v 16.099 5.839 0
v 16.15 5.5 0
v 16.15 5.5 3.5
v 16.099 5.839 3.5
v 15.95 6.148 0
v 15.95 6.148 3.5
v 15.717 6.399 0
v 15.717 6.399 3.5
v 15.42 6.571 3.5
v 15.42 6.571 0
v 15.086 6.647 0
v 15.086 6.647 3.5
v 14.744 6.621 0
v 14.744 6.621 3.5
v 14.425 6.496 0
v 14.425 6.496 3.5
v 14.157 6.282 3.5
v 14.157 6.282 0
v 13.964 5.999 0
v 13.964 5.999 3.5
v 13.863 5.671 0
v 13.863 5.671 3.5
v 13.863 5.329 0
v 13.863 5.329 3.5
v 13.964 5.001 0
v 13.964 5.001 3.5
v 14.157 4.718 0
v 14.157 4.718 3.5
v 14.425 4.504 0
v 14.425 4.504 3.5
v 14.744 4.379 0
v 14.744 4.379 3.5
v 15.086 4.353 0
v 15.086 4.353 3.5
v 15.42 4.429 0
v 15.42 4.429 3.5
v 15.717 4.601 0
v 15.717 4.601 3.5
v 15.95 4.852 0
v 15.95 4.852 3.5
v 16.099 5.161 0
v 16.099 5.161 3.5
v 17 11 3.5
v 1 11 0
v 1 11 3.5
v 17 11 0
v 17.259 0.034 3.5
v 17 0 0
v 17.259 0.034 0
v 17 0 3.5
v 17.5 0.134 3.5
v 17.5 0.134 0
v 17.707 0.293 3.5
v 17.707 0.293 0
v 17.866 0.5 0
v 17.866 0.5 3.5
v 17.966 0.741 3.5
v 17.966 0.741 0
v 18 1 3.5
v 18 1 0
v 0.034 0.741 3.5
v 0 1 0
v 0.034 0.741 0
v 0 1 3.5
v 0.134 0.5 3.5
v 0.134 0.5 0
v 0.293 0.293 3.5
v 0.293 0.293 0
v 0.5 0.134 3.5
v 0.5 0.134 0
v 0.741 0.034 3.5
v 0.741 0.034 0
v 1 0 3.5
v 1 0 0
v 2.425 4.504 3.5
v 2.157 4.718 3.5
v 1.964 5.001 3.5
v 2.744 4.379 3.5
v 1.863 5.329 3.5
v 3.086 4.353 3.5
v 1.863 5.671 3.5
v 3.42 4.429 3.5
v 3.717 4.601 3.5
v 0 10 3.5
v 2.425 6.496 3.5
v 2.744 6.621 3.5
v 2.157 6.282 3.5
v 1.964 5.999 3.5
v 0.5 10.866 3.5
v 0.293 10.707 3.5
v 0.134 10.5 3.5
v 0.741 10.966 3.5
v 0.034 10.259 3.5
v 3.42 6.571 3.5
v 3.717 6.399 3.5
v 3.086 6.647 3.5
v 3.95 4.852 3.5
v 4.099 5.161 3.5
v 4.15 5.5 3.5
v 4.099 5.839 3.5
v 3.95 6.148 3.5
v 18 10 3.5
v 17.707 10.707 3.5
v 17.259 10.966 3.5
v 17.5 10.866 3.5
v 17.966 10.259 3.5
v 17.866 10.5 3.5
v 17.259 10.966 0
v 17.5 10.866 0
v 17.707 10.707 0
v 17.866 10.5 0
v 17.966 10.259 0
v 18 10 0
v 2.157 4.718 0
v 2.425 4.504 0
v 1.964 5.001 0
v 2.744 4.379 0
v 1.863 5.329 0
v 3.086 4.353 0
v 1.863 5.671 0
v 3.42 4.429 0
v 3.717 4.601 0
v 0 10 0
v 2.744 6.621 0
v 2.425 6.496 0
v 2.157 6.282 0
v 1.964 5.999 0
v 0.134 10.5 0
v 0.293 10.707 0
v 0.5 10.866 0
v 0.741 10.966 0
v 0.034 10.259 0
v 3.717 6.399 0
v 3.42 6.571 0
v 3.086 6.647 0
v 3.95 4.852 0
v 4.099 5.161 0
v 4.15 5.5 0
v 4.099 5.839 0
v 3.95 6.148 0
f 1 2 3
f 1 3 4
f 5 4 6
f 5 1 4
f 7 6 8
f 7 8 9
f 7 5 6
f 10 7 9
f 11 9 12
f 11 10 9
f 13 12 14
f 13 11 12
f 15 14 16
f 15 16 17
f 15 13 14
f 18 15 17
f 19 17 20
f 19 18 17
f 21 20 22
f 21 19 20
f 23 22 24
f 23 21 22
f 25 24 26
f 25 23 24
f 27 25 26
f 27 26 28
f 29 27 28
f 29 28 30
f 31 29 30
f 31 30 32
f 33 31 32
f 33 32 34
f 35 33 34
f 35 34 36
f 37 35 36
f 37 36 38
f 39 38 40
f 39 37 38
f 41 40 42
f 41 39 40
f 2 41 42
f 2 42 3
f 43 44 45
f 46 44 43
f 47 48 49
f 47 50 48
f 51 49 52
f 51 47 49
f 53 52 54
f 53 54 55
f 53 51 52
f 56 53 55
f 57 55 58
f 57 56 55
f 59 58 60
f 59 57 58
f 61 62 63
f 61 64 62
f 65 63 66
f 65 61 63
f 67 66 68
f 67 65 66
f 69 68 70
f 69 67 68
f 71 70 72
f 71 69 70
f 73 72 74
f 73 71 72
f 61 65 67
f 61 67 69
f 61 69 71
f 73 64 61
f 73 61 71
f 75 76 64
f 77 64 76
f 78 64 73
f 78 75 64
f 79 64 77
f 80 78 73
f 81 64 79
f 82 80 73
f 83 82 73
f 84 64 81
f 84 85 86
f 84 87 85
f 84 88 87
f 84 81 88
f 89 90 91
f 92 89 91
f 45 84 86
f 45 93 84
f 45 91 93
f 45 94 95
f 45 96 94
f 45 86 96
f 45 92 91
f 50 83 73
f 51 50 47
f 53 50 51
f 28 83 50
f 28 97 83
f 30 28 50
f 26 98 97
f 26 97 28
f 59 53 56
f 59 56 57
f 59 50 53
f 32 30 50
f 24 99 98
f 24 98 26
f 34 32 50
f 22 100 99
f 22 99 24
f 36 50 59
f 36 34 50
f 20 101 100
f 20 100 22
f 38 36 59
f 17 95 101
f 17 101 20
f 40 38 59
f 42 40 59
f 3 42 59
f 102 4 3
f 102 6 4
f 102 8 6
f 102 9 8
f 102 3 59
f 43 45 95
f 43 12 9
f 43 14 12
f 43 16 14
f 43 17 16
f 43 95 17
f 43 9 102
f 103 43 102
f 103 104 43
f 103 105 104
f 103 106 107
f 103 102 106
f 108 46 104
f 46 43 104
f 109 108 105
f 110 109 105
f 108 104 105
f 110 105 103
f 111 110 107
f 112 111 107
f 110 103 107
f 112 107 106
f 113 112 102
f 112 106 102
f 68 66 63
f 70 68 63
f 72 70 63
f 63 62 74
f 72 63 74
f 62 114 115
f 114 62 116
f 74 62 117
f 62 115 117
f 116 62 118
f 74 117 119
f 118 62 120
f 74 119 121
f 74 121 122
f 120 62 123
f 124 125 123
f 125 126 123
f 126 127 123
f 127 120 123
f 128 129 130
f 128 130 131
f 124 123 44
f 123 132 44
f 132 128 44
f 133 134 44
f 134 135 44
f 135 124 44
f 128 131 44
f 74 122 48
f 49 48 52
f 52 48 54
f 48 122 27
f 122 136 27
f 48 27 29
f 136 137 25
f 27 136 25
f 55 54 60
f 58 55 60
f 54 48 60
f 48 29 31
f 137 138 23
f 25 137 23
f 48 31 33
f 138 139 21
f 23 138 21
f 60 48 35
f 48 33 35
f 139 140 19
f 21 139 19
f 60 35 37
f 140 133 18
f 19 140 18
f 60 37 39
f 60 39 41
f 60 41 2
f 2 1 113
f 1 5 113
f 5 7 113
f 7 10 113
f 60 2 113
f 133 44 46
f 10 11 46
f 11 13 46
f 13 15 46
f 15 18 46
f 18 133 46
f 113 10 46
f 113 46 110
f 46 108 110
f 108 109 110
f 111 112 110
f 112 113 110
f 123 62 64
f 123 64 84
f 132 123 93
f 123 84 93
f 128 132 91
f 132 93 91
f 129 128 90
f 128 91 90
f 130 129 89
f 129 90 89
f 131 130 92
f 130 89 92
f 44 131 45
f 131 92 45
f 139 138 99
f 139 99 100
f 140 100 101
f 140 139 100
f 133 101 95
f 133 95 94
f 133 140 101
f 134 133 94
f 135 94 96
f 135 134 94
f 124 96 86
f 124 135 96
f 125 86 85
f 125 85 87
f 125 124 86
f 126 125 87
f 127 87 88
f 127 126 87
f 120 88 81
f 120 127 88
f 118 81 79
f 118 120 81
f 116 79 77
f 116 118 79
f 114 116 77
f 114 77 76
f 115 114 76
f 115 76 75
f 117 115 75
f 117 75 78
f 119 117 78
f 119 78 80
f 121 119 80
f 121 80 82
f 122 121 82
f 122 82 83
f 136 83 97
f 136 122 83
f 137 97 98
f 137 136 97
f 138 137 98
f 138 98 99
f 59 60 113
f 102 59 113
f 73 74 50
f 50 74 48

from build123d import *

# Parameters (mm, degrees)
SKETCH_1_W      = 18
SKETCH_1_H      = 11
SKETCH_1_R      = 1.15
EXTRUDE_1_DEPTH = 3.5
FILLET_1_R      = 1


with BuildPart() as part:
    # 草图1 → 凸台-拉伸1 (new body)
    with BuildSketch(Plane.XY):
        with Locations((9, 5.5)):
            Rectangle(SKETCH_1_W, SKETCH_1_H)
        with Locations((3, 5.5)):
            Circle(SKETCH_1_R, mode=Mode.SUBTRACT)
        with Locations((15, 5.5)):
            Circle(SKETCH_1_R, mode=Mode.SUBTRACT)
    extrude(amount=EXTRUDE_1_DEPTH)

    # 圆角1
    fillet_1_edges = [part.edges().sort_by_distance(p)[0] for p in [
        (0, 11, 1.75),
        (18, 11, 1.75),
        (18, 0, 1.75),
        (0, 0, 1.75),
    ]]
    fillet(fillet_1_edges, radius=FILLET_1_R)


solid = part.part
